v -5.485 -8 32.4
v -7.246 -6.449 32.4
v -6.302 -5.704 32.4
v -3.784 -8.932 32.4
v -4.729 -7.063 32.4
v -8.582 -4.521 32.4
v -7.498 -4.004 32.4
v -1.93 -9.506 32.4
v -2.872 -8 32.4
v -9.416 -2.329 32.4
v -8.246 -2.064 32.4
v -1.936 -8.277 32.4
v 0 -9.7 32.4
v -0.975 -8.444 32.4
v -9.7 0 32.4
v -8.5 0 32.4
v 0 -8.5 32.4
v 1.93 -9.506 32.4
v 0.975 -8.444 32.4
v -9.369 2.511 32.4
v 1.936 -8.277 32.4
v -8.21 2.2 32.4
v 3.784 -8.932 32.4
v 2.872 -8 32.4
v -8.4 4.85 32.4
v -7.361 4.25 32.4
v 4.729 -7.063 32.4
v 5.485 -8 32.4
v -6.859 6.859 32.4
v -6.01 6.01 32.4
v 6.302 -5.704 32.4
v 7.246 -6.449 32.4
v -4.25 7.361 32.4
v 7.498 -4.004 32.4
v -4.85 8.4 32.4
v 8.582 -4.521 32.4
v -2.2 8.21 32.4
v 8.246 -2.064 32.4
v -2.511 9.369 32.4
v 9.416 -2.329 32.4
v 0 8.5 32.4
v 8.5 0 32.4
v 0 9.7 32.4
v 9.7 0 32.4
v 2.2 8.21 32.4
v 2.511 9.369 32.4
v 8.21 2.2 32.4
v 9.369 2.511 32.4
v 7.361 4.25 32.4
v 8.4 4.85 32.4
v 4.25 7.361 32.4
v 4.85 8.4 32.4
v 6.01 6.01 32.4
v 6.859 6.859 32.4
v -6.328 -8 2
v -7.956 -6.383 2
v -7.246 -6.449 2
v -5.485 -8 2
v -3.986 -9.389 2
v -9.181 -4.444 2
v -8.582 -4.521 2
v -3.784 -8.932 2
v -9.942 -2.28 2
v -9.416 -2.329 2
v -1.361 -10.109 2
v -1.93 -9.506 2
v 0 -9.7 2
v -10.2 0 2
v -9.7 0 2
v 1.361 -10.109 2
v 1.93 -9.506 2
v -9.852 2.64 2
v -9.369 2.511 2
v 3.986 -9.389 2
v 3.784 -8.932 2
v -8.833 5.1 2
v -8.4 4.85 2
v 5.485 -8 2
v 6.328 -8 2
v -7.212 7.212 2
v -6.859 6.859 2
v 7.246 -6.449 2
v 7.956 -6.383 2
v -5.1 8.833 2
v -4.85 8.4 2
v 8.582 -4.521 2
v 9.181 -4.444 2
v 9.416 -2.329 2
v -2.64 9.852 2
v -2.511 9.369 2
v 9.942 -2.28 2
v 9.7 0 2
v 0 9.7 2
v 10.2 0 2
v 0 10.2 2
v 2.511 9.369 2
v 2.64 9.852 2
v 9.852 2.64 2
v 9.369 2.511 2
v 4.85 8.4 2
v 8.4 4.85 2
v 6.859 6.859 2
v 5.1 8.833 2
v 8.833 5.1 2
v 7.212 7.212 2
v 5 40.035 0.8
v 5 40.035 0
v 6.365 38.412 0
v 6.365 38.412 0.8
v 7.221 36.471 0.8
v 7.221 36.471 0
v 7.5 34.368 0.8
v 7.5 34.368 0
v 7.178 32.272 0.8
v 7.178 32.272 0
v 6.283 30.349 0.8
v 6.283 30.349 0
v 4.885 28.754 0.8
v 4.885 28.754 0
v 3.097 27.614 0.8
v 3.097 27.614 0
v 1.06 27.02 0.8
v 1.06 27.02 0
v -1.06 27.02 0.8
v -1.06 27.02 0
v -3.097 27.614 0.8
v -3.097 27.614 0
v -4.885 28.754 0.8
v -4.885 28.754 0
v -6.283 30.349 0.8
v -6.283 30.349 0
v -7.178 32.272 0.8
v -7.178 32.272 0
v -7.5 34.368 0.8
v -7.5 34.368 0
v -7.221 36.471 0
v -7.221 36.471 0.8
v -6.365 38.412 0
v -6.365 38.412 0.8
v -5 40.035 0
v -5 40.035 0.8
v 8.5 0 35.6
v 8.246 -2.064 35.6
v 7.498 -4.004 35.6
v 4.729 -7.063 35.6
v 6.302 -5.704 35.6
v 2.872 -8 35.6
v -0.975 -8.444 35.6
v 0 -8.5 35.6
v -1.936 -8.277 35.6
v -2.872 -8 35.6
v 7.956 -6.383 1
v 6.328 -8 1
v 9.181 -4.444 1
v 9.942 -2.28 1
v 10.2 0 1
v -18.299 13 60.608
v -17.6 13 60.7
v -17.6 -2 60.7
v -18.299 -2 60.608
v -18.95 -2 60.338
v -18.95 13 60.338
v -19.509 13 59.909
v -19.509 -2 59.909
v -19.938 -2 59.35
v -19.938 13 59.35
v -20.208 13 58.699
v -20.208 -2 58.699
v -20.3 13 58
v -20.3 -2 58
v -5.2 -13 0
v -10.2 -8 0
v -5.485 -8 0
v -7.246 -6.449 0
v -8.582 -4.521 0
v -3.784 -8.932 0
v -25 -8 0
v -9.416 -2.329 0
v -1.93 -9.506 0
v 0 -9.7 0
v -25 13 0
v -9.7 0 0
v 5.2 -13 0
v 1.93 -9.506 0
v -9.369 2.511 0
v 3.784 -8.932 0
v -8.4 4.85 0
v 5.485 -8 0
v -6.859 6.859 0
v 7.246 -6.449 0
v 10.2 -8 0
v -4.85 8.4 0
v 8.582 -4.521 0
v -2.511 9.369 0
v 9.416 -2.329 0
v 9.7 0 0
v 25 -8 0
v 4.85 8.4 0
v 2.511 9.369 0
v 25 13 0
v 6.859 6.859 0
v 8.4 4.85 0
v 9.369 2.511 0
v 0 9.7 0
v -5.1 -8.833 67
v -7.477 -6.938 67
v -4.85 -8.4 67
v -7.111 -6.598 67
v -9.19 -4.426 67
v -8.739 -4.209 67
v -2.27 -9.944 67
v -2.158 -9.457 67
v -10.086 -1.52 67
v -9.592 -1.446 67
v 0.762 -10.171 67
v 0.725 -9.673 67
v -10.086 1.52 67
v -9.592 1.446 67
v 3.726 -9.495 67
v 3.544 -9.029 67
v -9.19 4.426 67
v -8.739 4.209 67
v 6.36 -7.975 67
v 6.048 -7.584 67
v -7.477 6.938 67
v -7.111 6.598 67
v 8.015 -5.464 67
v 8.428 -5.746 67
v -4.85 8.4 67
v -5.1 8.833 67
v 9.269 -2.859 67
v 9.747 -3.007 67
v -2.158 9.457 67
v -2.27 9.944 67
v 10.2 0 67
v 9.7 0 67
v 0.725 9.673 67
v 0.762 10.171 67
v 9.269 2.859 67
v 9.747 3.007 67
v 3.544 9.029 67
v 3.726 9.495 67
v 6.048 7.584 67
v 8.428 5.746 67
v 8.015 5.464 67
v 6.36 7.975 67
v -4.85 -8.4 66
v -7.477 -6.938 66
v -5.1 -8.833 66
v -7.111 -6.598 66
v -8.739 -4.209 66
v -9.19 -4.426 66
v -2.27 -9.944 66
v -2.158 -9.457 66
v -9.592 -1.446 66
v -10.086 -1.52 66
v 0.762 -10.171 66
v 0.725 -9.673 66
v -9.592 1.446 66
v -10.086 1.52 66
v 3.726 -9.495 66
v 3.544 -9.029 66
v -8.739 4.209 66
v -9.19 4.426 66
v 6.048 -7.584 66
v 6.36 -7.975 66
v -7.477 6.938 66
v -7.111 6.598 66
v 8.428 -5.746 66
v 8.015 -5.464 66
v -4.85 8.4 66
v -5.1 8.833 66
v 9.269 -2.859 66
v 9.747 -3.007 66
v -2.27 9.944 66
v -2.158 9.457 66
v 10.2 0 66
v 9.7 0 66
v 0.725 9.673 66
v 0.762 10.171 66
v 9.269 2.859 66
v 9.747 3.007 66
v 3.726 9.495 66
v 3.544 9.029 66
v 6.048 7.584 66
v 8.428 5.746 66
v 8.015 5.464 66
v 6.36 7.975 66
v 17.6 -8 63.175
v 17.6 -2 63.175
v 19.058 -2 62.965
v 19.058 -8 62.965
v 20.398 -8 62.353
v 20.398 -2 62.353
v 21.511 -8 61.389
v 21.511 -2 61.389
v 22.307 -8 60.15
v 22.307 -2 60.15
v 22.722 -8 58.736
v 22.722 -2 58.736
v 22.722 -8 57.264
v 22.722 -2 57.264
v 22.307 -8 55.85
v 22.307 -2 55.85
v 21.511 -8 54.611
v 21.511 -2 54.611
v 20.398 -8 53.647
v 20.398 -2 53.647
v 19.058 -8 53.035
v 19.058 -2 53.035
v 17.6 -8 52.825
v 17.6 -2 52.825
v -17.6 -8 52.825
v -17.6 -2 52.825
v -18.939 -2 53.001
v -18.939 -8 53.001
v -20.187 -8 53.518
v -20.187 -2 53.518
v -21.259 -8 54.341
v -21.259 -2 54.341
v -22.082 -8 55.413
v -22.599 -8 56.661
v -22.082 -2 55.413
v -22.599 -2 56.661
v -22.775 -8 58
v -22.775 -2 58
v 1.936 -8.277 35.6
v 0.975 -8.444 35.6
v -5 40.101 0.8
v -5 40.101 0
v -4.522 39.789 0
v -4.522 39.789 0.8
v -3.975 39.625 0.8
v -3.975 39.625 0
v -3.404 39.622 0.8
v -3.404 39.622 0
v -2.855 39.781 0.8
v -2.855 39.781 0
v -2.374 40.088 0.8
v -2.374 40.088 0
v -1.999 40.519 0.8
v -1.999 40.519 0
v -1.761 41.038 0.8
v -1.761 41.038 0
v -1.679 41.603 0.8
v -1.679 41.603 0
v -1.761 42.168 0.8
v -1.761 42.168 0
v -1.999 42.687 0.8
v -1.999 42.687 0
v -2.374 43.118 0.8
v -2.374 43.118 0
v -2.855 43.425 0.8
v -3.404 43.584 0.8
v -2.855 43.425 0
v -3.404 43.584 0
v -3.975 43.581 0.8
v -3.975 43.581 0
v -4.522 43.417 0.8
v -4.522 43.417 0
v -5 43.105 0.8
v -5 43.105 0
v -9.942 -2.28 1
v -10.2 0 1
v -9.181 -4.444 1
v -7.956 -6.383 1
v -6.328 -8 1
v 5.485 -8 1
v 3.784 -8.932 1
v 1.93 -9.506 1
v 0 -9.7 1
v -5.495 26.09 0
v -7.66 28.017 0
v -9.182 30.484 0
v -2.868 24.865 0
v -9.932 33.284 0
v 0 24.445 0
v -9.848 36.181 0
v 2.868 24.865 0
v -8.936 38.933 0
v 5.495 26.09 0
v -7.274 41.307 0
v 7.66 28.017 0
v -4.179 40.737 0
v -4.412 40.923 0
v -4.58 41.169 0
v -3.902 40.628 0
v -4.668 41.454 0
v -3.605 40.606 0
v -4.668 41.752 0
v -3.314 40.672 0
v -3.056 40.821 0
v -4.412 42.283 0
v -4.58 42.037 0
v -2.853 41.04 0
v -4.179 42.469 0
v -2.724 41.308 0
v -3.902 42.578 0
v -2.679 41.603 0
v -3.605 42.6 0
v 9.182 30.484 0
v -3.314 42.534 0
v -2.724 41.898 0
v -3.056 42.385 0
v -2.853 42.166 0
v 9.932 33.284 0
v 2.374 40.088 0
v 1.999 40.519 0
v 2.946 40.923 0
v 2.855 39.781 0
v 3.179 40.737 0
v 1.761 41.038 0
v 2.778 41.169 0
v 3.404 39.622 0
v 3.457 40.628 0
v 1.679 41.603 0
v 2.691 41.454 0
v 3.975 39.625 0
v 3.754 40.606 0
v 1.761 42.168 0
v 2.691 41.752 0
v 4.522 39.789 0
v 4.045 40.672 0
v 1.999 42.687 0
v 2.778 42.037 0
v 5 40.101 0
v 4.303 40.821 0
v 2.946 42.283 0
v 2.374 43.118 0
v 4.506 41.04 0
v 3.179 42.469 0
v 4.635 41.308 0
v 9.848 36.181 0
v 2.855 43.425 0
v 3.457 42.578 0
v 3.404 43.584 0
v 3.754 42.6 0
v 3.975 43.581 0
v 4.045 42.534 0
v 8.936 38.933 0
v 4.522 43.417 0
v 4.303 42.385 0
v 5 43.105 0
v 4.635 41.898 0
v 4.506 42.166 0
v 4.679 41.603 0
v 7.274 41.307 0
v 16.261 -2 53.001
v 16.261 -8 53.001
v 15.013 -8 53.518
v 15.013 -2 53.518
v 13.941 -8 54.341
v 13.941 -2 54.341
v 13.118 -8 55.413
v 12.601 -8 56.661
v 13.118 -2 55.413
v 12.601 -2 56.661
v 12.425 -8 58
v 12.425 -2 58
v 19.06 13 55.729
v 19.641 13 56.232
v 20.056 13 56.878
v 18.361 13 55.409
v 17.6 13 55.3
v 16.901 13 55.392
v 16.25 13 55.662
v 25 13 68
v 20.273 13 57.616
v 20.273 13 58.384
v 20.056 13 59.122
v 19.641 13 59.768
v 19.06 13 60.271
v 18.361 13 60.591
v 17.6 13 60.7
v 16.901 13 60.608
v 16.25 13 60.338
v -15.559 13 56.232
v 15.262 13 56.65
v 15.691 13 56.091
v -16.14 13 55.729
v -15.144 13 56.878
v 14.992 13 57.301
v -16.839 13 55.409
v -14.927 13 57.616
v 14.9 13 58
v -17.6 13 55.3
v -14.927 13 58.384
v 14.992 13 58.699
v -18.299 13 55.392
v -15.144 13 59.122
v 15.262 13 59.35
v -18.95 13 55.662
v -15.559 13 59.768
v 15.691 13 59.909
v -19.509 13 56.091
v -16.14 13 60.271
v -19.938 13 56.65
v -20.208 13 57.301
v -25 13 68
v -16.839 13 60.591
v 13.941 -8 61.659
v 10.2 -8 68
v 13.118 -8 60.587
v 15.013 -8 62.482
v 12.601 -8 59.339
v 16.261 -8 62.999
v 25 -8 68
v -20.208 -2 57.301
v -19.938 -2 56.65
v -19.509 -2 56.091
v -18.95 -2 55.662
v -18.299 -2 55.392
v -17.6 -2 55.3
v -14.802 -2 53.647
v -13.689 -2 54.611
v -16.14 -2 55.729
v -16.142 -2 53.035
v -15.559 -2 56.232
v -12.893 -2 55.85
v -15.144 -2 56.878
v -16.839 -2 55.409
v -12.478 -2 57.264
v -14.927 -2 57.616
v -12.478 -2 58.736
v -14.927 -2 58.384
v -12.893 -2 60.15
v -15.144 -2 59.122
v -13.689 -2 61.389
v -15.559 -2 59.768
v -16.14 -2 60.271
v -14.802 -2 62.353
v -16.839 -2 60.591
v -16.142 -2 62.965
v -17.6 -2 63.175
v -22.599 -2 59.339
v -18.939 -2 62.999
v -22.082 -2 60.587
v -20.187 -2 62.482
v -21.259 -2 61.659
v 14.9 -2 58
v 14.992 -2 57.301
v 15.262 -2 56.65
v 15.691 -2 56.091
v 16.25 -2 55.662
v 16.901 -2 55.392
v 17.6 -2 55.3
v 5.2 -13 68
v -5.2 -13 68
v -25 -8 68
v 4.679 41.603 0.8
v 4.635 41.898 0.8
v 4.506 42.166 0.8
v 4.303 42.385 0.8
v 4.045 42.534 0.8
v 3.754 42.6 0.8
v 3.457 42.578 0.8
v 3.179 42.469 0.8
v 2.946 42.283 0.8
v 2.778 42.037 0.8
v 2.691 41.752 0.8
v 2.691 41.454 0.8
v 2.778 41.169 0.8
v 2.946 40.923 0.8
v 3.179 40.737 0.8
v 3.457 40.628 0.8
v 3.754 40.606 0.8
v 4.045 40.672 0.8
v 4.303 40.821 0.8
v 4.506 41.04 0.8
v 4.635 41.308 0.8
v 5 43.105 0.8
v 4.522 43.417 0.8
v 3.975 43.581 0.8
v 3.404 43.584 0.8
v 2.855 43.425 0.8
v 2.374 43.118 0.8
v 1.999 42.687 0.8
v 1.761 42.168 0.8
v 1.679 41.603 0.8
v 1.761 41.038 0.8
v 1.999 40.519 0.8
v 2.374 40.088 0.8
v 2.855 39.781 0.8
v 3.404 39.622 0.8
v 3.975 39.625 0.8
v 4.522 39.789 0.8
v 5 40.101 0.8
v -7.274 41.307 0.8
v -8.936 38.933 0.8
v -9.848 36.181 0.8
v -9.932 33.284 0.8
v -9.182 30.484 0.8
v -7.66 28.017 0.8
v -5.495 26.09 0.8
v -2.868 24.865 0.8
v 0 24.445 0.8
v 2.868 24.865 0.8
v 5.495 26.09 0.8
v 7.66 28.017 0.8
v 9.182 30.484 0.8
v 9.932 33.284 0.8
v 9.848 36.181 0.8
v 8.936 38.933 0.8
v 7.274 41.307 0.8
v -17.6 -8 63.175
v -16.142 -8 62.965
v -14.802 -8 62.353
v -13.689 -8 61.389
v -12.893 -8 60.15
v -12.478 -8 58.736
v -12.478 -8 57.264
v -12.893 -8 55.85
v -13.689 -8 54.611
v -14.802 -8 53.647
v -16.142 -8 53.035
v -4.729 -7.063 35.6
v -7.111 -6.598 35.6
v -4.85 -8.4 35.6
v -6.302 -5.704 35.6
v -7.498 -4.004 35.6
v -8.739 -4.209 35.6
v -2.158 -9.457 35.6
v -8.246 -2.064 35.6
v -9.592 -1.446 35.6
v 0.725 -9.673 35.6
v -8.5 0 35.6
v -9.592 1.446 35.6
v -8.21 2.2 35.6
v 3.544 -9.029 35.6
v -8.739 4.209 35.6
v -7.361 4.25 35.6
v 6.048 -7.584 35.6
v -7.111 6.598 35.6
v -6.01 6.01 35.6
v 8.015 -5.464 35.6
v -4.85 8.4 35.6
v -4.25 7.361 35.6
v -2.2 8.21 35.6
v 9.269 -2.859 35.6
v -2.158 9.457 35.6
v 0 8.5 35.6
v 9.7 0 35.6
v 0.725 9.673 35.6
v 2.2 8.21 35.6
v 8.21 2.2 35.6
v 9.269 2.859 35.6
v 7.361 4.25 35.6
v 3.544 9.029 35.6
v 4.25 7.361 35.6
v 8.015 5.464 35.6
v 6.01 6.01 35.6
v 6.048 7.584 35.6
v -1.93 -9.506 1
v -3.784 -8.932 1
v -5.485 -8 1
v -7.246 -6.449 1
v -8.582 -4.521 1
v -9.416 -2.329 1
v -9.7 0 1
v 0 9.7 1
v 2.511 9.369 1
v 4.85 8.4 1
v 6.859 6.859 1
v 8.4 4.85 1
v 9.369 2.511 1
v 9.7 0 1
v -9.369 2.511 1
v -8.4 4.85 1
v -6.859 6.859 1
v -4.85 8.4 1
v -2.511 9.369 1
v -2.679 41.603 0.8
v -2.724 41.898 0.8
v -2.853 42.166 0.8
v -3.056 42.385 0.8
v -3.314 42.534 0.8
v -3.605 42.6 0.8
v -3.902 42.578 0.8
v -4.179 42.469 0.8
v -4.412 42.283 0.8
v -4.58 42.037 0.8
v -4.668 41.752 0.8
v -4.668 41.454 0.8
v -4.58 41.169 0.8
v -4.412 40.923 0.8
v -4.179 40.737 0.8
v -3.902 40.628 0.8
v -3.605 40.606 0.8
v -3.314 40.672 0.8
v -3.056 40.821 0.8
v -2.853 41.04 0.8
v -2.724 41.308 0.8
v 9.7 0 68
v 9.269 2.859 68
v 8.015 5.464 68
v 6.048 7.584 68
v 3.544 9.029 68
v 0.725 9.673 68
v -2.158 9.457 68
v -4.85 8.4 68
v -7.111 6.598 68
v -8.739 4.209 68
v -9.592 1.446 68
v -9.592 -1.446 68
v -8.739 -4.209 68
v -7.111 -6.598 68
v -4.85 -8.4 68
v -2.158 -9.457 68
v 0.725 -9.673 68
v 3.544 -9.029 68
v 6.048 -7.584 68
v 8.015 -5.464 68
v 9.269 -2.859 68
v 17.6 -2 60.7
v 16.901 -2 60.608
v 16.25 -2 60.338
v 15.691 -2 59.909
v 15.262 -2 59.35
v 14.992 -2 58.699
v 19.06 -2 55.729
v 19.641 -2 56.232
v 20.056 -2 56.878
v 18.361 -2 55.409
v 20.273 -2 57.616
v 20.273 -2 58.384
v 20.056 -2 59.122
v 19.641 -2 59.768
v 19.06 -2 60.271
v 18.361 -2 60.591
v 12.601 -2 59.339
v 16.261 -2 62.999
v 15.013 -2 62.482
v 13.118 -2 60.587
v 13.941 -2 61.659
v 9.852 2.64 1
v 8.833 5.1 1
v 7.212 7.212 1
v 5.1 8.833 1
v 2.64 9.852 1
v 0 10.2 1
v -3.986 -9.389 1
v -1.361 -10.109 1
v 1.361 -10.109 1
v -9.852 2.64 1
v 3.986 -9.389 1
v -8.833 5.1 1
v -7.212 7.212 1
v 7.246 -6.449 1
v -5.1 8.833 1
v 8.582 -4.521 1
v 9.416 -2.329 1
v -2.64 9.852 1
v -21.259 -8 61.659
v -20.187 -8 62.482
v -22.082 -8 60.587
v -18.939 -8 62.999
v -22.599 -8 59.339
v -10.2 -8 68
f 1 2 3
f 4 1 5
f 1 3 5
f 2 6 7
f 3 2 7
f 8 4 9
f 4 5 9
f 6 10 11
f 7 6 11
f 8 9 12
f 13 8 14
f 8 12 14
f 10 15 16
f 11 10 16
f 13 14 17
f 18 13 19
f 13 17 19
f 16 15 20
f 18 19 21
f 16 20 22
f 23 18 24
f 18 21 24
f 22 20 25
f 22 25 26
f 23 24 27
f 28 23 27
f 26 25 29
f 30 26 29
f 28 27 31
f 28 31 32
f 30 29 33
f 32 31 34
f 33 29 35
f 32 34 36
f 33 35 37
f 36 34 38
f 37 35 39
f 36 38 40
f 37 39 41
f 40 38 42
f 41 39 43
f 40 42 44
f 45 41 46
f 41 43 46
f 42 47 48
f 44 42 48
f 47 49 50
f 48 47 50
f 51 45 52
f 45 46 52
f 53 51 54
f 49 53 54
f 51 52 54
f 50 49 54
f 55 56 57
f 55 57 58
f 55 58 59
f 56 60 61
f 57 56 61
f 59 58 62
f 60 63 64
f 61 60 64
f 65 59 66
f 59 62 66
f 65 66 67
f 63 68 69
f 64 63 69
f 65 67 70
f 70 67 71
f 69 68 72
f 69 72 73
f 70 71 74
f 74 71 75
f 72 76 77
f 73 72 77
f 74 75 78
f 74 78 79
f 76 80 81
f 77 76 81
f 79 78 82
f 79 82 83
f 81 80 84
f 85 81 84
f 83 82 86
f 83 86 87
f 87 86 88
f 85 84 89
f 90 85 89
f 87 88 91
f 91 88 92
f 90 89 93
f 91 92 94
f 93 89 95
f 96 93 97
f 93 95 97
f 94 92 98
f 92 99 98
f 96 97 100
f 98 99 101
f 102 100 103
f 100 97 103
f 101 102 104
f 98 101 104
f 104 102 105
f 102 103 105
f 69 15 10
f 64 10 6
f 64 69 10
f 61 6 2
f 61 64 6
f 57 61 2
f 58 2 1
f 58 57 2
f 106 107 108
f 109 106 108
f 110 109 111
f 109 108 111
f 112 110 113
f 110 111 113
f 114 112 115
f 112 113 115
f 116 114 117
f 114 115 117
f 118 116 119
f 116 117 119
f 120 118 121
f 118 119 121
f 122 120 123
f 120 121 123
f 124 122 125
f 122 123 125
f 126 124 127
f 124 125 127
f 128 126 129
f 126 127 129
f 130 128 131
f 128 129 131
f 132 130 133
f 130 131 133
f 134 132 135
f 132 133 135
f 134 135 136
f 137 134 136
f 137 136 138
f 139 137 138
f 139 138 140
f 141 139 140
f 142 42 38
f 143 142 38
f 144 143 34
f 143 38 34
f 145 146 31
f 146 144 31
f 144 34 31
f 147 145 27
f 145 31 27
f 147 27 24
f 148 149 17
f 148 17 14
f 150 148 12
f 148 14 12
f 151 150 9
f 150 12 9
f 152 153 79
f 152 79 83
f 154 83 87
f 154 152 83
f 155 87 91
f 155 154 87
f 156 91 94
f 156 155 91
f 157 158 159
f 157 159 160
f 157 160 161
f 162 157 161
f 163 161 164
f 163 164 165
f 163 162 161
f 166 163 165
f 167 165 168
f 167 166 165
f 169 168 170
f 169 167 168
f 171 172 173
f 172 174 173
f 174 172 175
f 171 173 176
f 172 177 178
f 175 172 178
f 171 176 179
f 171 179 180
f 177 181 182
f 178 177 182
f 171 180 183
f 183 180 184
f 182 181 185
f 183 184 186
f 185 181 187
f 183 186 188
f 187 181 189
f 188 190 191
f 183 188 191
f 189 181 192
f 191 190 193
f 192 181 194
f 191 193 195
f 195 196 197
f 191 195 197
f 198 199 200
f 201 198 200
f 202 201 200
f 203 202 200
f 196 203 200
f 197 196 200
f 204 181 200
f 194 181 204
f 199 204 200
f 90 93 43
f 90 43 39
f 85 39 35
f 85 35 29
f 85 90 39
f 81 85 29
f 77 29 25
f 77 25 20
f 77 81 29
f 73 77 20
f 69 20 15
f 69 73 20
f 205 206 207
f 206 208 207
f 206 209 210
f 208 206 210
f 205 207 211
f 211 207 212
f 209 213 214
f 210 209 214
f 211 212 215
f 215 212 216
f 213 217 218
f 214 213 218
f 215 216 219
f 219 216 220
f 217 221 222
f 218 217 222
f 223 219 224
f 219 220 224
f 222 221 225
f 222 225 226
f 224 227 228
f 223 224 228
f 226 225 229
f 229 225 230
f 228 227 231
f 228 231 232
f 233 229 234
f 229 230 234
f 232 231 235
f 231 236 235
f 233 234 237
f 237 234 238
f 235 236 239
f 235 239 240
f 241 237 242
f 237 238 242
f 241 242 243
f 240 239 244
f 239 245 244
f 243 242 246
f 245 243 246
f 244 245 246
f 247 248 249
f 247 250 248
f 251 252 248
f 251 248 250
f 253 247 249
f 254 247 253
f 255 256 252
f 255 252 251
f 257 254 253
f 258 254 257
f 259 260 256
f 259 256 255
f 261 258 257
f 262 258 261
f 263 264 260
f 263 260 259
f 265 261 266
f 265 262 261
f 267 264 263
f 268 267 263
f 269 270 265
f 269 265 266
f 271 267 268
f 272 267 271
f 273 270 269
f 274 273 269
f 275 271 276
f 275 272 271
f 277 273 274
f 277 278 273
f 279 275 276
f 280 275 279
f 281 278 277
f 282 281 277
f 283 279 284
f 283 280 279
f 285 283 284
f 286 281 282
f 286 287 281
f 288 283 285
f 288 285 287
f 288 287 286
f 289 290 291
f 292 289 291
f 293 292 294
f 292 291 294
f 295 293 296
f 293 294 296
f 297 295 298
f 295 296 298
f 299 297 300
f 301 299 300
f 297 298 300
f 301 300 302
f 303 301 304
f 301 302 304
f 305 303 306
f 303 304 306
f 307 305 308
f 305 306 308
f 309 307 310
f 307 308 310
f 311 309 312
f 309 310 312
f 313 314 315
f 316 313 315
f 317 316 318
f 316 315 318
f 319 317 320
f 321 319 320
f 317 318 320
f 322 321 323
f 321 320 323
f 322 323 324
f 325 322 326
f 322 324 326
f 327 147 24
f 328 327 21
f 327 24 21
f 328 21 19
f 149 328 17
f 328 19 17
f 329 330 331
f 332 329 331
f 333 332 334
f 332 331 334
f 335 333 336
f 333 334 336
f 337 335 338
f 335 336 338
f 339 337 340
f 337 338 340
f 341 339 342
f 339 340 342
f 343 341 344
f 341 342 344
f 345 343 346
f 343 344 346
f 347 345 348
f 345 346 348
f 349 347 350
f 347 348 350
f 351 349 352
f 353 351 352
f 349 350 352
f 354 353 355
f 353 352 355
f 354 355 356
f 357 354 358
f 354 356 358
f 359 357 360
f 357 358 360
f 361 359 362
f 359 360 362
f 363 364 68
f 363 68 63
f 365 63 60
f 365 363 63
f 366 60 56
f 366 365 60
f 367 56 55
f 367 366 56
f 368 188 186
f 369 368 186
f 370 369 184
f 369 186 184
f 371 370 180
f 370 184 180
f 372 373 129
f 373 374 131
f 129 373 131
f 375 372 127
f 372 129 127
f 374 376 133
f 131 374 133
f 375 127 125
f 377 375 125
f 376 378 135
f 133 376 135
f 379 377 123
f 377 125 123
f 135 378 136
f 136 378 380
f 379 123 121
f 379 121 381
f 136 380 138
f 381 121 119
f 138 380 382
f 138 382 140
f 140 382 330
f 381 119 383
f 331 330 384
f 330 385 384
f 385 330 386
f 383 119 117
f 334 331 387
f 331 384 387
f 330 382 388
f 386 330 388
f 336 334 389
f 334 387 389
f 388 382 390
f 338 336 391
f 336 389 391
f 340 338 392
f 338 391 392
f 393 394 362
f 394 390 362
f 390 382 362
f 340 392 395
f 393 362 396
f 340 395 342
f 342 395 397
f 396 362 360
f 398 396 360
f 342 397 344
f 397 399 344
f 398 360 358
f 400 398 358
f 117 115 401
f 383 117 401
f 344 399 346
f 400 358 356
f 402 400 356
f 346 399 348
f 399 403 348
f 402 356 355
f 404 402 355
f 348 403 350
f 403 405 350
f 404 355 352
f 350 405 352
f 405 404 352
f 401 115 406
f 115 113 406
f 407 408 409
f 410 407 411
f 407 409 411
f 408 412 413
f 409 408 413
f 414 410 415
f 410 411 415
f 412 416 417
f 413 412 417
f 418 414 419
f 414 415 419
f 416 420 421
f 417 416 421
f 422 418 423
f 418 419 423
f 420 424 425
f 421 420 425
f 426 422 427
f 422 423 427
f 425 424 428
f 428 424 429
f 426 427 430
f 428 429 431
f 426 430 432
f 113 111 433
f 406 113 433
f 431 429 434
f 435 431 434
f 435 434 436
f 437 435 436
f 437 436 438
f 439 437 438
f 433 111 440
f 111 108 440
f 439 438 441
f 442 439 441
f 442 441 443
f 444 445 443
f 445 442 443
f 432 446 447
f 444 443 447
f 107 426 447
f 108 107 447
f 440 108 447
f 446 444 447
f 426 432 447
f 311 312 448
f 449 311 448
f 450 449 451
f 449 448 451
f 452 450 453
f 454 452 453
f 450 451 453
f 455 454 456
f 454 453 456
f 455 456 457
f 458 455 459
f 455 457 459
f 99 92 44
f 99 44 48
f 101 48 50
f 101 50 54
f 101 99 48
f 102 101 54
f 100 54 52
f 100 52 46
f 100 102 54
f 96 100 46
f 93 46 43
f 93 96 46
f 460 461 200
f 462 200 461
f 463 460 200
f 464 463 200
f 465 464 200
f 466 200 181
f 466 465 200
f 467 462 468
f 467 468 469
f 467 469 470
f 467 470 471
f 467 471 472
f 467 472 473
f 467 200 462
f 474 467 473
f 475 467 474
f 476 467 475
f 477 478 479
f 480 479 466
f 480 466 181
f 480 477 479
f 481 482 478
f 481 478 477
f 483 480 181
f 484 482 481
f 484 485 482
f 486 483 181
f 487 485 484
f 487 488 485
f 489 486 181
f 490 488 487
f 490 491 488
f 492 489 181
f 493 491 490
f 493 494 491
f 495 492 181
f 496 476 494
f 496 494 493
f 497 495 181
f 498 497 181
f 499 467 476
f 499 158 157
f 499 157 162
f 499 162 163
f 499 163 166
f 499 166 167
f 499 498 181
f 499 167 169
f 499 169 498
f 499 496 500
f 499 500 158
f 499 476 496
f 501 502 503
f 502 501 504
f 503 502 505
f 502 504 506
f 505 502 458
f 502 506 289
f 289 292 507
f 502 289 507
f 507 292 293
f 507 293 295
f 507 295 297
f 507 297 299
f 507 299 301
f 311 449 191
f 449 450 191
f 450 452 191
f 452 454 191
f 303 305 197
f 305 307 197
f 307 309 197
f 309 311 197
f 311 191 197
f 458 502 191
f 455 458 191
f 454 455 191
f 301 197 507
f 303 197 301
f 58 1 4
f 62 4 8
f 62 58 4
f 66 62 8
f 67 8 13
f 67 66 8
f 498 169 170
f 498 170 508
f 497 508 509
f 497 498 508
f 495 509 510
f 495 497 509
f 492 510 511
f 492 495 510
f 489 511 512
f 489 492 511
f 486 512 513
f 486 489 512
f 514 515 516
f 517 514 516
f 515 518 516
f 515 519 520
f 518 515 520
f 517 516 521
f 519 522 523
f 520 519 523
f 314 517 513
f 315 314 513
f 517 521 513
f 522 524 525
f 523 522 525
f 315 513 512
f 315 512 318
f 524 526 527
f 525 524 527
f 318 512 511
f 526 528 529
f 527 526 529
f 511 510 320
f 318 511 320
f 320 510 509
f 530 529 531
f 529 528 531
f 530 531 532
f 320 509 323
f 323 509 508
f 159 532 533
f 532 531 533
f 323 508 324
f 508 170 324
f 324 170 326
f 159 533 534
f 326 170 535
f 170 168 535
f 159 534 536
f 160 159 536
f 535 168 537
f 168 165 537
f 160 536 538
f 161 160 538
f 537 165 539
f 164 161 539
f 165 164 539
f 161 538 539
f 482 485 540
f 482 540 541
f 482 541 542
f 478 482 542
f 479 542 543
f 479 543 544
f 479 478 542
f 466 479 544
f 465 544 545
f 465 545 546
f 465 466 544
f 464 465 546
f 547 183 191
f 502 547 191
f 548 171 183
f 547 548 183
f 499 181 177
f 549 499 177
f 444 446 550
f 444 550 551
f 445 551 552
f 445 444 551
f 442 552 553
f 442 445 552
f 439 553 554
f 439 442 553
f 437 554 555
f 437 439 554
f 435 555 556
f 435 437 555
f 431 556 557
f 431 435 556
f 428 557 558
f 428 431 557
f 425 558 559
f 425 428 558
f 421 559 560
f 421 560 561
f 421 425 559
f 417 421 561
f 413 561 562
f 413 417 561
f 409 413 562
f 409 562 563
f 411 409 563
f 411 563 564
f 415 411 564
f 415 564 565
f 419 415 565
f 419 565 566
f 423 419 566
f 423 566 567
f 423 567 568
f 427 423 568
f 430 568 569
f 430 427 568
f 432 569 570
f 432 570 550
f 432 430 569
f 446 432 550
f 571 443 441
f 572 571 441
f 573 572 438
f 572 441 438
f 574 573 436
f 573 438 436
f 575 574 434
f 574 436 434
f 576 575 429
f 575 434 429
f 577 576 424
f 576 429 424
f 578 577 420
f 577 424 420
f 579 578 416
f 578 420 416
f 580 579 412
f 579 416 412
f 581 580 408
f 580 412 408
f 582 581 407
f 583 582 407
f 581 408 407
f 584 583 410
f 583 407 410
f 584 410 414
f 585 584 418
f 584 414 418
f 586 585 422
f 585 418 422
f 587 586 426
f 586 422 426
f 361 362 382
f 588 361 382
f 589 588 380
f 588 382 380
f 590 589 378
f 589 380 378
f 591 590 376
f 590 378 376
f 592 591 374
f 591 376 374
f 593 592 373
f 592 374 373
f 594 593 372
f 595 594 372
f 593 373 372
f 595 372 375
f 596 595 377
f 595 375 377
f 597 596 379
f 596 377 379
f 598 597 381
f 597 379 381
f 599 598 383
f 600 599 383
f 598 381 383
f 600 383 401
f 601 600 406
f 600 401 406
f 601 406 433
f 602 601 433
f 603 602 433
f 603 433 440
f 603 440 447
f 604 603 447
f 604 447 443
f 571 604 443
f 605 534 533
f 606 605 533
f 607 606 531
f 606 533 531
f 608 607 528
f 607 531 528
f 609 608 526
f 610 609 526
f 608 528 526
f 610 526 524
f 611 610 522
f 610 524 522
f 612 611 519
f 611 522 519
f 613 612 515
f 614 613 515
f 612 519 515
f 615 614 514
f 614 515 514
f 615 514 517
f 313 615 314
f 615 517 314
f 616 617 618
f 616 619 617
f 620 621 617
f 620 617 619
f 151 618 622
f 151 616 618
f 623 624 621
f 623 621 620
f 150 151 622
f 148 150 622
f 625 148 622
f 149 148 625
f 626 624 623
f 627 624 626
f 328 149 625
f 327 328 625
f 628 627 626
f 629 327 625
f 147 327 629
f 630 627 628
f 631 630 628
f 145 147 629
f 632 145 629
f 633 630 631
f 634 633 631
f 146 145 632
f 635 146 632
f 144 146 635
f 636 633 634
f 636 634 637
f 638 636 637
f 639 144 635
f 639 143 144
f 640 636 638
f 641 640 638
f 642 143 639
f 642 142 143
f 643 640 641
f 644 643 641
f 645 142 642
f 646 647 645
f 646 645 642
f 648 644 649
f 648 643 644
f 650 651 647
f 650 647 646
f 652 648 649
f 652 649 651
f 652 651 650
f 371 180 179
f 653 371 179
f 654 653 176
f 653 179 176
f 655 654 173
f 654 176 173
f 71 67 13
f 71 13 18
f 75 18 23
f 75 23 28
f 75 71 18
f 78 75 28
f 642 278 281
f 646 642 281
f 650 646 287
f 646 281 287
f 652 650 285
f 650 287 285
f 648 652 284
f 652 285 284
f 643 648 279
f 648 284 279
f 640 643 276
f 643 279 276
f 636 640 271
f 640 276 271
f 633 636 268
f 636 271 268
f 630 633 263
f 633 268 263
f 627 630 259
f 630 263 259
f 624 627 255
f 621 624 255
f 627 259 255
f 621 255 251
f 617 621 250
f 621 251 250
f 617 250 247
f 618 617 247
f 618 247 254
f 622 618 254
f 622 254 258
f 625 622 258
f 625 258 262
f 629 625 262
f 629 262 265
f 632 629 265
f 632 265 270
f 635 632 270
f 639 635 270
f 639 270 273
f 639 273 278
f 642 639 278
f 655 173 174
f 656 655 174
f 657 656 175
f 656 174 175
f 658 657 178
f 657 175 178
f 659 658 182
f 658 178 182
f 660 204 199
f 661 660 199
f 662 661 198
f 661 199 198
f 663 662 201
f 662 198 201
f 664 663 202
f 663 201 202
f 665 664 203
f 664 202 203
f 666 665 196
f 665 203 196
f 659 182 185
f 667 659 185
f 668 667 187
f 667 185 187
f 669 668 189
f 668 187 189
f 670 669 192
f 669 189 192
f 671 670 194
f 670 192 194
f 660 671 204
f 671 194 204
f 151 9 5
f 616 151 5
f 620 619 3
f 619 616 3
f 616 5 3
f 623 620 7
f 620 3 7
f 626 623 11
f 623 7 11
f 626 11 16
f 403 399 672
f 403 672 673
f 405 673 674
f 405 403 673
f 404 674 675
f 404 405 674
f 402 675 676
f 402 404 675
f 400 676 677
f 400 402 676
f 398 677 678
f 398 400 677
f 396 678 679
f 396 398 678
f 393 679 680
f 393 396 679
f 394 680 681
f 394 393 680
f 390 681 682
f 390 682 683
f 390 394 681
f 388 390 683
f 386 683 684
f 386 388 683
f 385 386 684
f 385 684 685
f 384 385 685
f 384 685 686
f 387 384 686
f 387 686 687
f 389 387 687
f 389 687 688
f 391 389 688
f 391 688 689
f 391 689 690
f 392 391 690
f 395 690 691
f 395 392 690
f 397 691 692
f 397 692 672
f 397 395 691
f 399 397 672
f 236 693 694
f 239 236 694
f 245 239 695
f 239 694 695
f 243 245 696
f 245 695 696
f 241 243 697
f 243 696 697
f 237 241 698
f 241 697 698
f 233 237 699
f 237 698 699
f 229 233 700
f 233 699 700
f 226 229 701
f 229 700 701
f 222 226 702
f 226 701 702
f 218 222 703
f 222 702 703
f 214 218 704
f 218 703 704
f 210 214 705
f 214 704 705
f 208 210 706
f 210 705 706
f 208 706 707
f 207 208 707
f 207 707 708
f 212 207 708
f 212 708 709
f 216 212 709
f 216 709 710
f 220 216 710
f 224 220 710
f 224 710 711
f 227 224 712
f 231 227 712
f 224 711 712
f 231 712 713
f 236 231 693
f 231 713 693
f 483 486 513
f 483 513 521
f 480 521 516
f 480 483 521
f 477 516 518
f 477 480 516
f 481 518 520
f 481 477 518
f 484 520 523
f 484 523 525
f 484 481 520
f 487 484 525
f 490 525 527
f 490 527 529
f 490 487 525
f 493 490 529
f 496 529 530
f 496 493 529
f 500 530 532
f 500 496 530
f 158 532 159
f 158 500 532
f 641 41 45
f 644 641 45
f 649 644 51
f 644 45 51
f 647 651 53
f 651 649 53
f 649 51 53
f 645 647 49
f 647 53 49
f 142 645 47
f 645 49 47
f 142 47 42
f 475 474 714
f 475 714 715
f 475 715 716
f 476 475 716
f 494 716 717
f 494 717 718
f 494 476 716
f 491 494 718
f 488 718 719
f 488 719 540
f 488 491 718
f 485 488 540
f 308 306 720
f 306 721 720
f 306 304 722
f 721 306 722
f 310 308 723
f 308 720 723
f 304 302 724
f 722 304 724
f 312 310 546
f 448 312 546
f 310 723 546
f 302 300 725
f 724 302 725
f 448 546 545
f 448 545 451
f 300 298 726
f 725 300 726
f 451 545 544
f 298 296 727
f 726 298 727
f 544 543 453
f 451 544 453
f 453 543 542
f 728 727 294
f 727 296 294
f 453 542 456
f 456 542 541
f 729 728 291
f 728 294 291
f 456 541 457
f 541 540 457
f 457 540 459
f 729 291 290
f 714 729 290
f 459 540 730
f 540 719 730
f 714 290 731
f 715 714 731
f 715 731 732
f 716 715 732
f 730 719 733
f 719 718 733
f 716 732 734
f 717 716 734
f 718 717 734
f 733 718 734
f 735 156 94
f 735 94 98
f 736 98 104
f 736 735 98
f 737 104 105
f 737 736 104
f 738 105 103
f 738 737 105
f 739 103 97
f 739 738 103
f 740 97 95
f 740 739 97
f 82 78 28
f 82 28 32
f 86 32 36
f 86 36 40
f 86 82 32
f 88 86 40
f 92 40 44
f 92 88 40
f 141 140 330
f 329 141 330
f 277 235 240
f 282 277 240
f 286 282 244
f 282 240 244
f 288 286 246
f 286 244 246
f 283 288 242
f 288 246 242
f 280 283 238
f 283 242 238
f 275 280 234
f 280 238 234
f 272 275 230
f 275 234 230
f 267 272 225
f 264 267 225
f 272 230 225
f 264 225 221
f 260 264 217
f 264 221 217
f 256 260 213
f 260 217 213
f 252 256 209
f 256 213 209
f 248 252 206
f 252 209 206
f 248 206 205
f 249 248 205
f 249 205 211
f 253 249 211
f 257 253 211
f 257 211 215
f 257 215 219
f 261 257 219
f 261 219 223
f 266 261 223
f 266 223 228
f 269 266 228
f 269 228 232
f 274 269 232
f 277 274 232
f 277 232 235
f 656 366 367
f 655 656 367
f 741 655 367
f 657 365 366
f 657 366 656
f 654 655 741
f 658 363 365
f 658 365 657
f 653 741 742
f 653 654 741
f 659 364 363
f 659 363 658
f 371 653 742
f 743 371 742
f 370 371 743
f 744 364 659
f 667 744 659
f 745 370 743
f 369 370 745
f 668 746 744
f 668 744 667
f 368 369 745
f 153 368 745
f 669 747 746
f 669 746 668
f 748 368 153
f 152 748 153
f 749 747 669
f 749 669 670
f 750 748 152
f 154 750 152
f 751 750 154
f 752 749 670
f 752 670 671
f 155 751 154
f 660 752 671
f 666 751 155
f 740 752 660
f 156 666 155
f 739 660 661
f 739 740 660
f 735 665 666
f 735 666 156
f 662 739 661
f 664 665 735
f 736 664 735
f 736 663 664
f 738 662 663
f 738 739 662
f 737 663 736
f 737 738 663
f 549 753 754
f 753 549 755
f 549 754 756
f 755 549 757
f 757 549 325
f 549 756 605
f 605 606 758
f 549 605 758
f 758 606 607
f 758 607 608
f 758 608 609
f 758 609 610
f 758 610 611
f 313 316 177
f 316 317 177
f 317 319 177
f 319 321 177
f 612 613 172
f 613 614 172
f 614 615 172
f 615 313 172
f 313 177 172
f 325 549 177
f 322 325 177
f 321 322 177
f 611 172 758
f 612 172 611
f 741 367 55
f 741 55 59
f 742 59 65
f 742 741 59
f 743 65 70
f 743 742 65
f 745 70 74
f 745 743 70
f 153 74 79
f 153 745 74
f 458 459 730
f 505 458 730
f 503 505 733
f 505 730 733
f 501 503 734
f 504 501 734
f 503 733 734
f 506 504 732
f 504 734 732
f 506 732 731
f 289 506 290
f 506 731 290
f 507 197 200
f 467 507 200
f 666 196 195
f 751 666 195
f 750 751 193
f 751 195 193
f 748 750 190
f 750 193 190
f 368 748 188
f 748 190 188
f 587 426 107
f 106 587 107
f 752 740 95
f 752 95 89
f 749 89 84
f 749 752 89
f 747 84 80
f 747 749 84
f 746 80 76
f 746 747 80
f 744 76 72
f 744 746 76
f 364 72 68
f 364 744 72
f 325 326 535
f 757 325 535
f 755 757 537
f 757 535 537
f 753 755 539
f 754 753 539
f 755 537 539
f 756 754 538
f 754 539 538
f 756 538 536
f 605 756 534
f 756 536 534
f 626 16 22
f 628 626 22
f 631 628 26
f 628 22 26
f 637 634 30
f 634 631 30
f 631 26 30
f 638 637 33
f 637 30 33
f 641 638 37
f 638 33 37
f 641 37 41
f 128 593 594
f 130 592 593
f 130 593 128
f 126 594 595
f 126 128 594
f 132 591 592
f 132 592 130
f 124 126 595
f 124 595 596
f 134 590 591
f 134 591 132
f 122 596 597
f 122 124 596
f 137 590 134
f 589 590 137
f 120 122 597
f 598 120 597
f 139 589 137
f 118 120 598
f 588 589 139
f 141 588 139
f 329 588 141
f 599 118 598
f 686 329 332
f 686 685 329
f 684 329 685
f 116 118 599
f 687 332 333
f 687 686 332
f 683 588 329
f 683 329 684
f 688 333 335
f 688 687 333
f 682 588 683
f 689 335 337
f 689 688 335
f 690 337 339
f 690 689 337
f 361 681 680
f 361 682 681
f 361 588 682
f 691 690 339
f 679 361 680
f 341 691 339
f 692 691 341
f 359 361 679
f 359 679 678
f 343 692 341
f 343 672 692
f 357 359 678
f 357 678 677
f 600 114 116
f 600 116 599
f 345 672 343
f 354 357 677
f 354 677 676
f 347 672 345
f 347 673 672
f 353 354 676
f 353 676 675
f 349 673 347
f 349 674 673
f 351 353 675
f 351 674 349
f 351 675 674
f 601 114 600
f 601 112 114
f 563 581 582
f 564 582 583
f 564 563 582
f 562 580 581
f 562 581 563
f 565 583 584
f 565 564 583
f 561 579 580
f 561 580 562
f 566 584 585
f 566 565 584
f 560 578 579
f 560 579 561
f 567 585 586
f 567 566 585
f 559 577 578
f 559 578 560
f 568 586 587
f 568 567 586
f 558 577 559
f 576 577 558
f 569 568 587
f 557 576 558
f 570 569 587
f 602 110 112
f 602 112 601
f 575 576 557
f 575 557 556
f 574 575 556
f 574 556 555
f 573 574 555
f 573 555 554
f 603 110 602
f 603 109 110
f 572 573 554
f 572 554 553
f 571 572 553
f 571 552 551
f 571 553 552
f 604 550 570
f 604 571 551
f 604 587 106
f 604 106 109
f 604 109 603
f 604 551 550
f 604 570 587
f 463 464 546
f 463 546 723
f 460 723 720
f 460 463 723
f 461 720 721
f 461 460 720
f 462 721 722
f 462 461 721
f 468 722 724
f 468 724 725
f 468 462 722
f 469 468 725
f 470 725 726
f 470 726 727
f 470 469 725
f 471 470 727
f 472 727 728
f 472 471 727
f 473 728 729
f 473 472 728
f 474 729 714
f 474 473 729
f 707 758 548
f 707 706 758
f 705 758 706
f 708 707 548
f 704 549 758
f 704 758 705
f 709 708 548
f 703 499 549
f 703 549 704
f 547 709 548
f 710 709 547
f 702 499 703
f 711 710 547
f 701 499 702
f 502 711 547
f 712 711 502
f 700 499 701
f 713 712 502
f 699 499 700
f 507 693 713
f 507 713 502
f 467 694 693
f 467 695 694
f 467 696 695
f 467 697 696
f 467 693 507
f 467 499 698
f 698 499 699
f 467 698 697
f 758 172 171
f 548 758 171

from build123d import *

# Parameters (mm, degrees)
F0_W      = 12.8
F0_H      = 8
F0_W_2    = 2
F1_DEPTH  = 68
F2_DEPTH  = 32.4
F3_DEPTH  = 2
F4_DEPTH  = 1
F5_R      = 9.7
F5_R_2    = 8.5
F6_DEPTH  = 32.4
F5_R_3    = 10.2
F7_DEPTH  = 2
F8_DEPTH  = 1
F10_DEPTH = 21
F11_DEPTH = 15
F12_R     = 1
F13_DEPTH = 0.8


with BuildPart() as f1:
    # F0 (on Top) → F1 (new body)
    with BuildSketch(Plane.XY):
        Polygon((-10.2, 13), (-25, 13), (-25, 5), (-23, 3), (-23, 0), (-10.2, 0), align=None)
        with BuildLine():
            Line((0, 13), (-10.2, 13))
            Line((-10.2, 13), (-10.2, 0))
            ThreePointArc((-10.2, 0), (-7.2124891681, 7.2124891681), (0, 10.2))
            Line((0, 10.2), (0, 13))
        make_face()
        with BuildLine():
            Line((10.2, 13), (0, 13))
            Line((0, 13), (0, 10.2))
            ThreePointArc((0, 10.2), (7.2124891681, 7.2124891681), (10.2, 0))
            Line((10.2, 0), (10.2, 13))
        make_face()
        Polygon((25, 13), (10.2, 13), (10.2, 0), (23, 0), (23, 3), (25, 5), align=None)
        with BuildLine():
            ThreePointArc((0, -10.2), (-3.3496268449, -9.6343136756), (-6.3277168078, -8))
            Line((-6.3277168078, -8), (-10.2, -8))
            Line((-10.2, -8), (-5.2, -13))
            Line((-5.2, -13), (0, -13))
            Line((0, -13), (0, -10.2))
        make_face()
        with Locations((-16.6, -4)):
            Rectangle(F0_W, F0_H)
        with BuildLine():
            ThreePointArc((-6.3277168078, -8), (-9.1810323886, -4.4439446756), (-10.2, 0))
            Line((-10.2, 0), (-10.2, -8))
            Line((-10.2, -8), (-6.3277168078, -8))
        make_face()
        with Locations((16.6, -4)):
            Rectangle(F0_W, F0_H)
        with BuildLine():
            Line((10.2, -8), (10.2, 0))
            ThreePointArc((10.2, 0), (9.1810323886, -4.4439446756), (6.3277168078, -8))
            Line((6.3277168078, -8), (10.2, -8))
        make_face()
        with BuildLine():
            ThreePointArc((6.3277168078, -8), (3.3496268449, -9.6343136756), (0, -10.2))
            Line((0, -10.2), (0, -13))
            Line((0, -13), (5.2, -13))
            Line((5.2, -13), (10.2, -8))
            Line((10.2, -8), (6.3277168078, -8))
        make_face()
        with BuildLine():
            Line((-9.7, 0), (-10.2, 0))
            ThreePointArc((-10.2, 0), (-9.1810323886, -4.4439446756), (-6.3277168078, -8))
            Line((-6.3277168078, -8), (-5.4854352608, -8))
            ThreePointArc((-5.4854352608, -8), (-8.5819205901, -4.5211324892), (-9.7, 0))
        make_face()
        with BuildLine():
            Line((-5.4854352608, -8), (-6.3277168078, -8))
            ThreePointArc((-6.3277168078, -8), (-3.3496268449, -9.6343136756), (0, -10.2))
            Line((0, -10.2), (0, -9.7))
            ThreePointArc((0, -9.7), (-2.8714108031, -9.2652576866), (-5.4854352608, -8))
        make_face()
        with BuildLine():
            Line((0, -9.7), (0, -10.2))
            ThreePointArc((0, -10.2), (3.3496268449, -9.6343136756), (6.3277168078, -8))
            Line((6.3277168078, -8), (5.4854352608, -8))
            ThreePointArc((5.4854352608, -8), (2.8714108031, -9.2652576866), (0, -9.7))
        make_face()
        with BuildLine():
            ThreePointArc((6.3277168078, -8), (9.1810323886, -4.4439446756), (10.2, 0))
            Line((10.2, 0), (9.7, 0))
            ThreePointArc((9.7, 0), (8.5819205901, -4.5211324892), (5.4854352608, -8))
            Line((5.4854352608, -8), (6.3277168078, -8))
        make_face()
        with BuildLine():
            ThreePointArc((10.2, 0), (7.2124891681, 7.2124891681), (0, 10.2))
            Line((0, 10.2), (0, 9.7))
            ThreePointArc((0, 9.7), (6.8589357775, 6.8589357775), (9.7, 0))
            Line((9.7, 0), (10.2, 0))
        make_face()
        with BuildLine():
            ThreePointArc((0, 10.2), (-7.2124891681, 7.2124891681), (-10.2, 0))
            Line((-10.2, 0), (-9.7, 0))
            ThreePointArc((-9.7, 0), (-6.8589357775, 6.8589357775), (0, 9.7))
            Line((0, 9.7), (0, 10.2))
        make_face()
        with BuildLine():
            ThreePointArc((0, 9.7), (-6.8589357775, 6.8589357775), (-9.7, 0))
            Line((-9.7, 0), (-8.5, 0))
            ThreePointArc((-8.5, 0), (-6.0104076401, 6.0104076401), (0, 8.5))
            Line((0, 8.5), (0, 9.7))
        make_face()
        with BuildLine():
            Line((-8.5, 0), (-9.7, 0))
            ThreePointArc((-9.7, 0), (-8.5819205901, -4.5211324892), (-5.4854352608, -8))
            Line((-5.4854352608, -8), (-2.8722813233, -8))
            ThreePointArc((-2.8722813233, -8), (-6.9521360476, -4.8905832348), (-8.5, 0))
        make_face()
        with BuildLine():
            Line((-2.8722813233, -8), (-5.4854352608, -8))
            ThreePointArc((-5.4854352608, -8), (-2.8714108031, -9.2652576866), (0, -9.7))
            Line((0, -9.7), (0, -8.5))
            ThreePointArc((0, -8.5), (-1.4577379737, -8.3740671122), (-2.8722813233, -8))
        make_face()
        with BuildLine():
            Line((0, -8.5), (0, -9.7))
            ThreePointArc((0, -9.7), (2.8714108031, -9.2652576866), (5.4854352608, -8))
            Line((5.4854352608, -8), (2.8722813233, -8))
            ThreePointArc((2.8722813233, -8), (1.4577379737, -8.3740671122), (0, -8.5))
        make_face()
        with BuildLine():
            ThreePointArc((5.4854352608, -8), (8.5819205901, -4.5211324892), (9.7, 0))
            Line((9.7, 0), (8.5, 0))
            ThreePointArc((8.5, 0), (6.9521360476, -4.8905832348), (2.8722813233, -8))
            Line((2.8722813233, -8), (5.4854352608, -8))
        make_face()
        with BuildLine():
            ThreePointArc((9.7, 0), (6.8589357775, 6.8589357775), (0, 9.7))
            Line((0, 9.7), (0, 8.5))
            ThreePointArc((0, 8.5), (6.0104076401, 6.0104076401), (8.5, 0))
            Line((8.5, 0), (9.7, 0))
        make_face()
        with Locations((24, -4)):
            Rectangle(F0_W_2, F0_H)
        Polygon((25, 3), (25, 5), (23, 3), (23, 0), (25, 0), align=None)
        with Locations((-24, -4)):
            Rectangle(F0_W_2, F0_H)
        Polygon((-23, 3), (-25, 5), (-25, 3), (-25, 0), (-23, 0), align=None)
    extrude(amount=F1_DEPTH)

    # F0 (on Top) → F2 (cut)
    with BuildSketch(Plane.XY):
        with BuildLine():
            Line((-8.5, 0), (-9.7, 0))
            ThreePointArc((-9.7, 0), (-8.5819205901, -4.5211324892), (-5.4854352608, -8))
            Line((-5.4854352608, -8), (-2.8722813233, -8))
            ThreePointArc((-2.8722813233, -8), (-6.9521360476, -4.8905832348), (-8.5, 0))
        make_face()
        with BuildLine():
            Line((-2.8722813233, -8), (-5.4854352608, -8))
            ThreePointArc((-5.4854352608, -8), (-2.8714108031, -9.2652576866), (0, -9.7))
            Line((0, -9.7), (0, -8.5))
            ThreePointArc((0, -8.5), (-1.4577379737, -8.3740671122), (-2.8722813233, -8))
        make_face()
        with BuildLine():
            Line((0, -8.5), (0, -9.7))
            ThreePointArc((0, -9.7), (2.8714108031, -9.2652576866), (5.4854352608, -8))
            Line((5.4854352608, -8), (2.8722813233, -8))
            ThreePointArc((2.8722813233, -8), (1.4577379737, -8.3740671122), (0, -8.5))
        make_face()
        with BuildLine():
            ThreePointArc((5.4854352608, -8), (8.5819205901, -4.5211324892), (9.7, 0))
            Line((9.7, 0), (8.5, 0))
            ThreePointArc((8.5, 0), (6.9521360476, -4.8905832348), (2.8722813233, -8))
            Line((2.8722813233, -8), (5.4854352608, -8))
        make_face()
        with BuildLine():
            ThreePointArc((9.7, 0), (6.8589357775, 6.8589357775), (0, 9.7))
            Line((0, 9.7), (0, 8.5))
            ThreePointArc((0, 8.5), (6.0104076401, 6.0104076401), (8.5, 0))
            Line((8.5, 0), (9.7, 0))
        make_face()
        with BuildLine():
            ThreePointArc((0, 9.7), (-6.8589357775, 6.8589357775), (-9.7, 0))
            Line((-9.7, 0), (-8.5, 0))
            ThreePointArc((-8.5, 0), (-6.0104076401, 6.0104076401), (0, 8.5))
            Line((0, 8.5), (0, 9.7))
        make_face()
    extrude(amount=F2_DEPTH, mode=Mode.SUBTRACT)

    # F0 (on Top) → F3 (cut)
    with BuildSketch(Plane.XY):
        with BuildLine():
            Line((0, -9.7), (0, -10.2))
            ThreePointArc((0, -10.2), (3.3496268449, -9.6343136756), (6.3277168078, -8))
            Line((6.3277168078, -8), (5.4854352608, -8))
            ThreePointArc((5.4854352608, -8), (2.8714108031, -9.2652576866), (0, -9.7))
        make_face()
        with BuildLine():
            ThreePointArc((6.3277168078, -8), (9.1810323886, -4.4439446756), (10.2, 0))
            Line((10.2, 0), (9.7, 0))
            ThreePointArc((9.7, 0), (8.5819205901, -4.5211324892), (5.4854352608, -8))
            Line((5.4854352608, -8), (6.3277168078, -8))
        make_face()
        with BuildLine():
            ThreePointArc((10.2, 0), (7.2124891681, 7.2124891681), (0, 10.2))
            Line((0, 10.2), (0, 9.7))
            ThreePointArc((0, 9.7), (6.8589357775, 6.8589357775), (9.7, 0))
            Line((9.7, 0), (10.2, 0))
        make_face()
        with BuildLine():
            ThreePointArc((0, 10.2), (-7.2124891681, 7.2124891681), (-10.2, 0))
            Line((-10.2, 0), (-9.7, 0))
            ThreePointArc((-9.7, 0), (-6.8589357775, 6.8589357775), (0, 9.7))
            Line((0, 9.7), (0, 10.2))
        make_face()
        with BuildLine():
            Line((-9.7, 0), (-10.2, 0))
            ThreePointArc((-10.2, 0), (-9.1810323886, -4.4439446756), (-6.3277168078, -8))
            Line((-6.3277168078, -8), (-5.4854352608, -8))
            ThreePointArc((-5.4854352608, -8), (-8.5819205901, -4.5211324892), (-9.7, 0))
        make_face()
        with BuildLine():
            Line((-5.4854352608, -8), (-6.3277168078, -8))
            ThreePointArc((-6.3277168078, -8), (-3.3496268449, -9.6343136756), (0, -10.2))
            Line((0, -10.2), (0, -9.7))
            ThreePointArc((0, -9.7), (-2.8714108031, -9.2652576866), (-5.4854352608, -8))
        make_face()
    extrude(amount=F3_DEPTH, mode=Mode.SUBTRACT)

    # F0 (on Top) → F4 (join)
    with BuildSketch(Plane.XY):
        with BuildLine():
            Line((-9.7, 0), (-10.2, 0))
            ThreePointArc((-10.2, 0), (-9.1810323886, -4.4439446756), (-6.3277168078, -8))
            Line((-6.3277168078, -8), (-5.4854352608, -8))
            ThreePointArc((-5.4854352608, -8), (-8.5819205901, -4.5211324892), (-9.7, 0))
        make_face()
        with BuildLine():
            Line((-5.4854352608, -8), (-6.3277168078, -8))
            ThreePointArc((-6.3277168078, -8), (-3.3496268449, -9.6343136756), (0, -10.2))
            Line((0, -10.2), (0, -9.7))
            ThreePointArc((0, -9.7), (-2.8714108031, -9.2652576866), (-5.4854352608, -8))
        make_face()
        with BuildLine():
            Line((0, -9.7), (0, -10.2))
            ThreePointArc((0, -10.2), (3.3496268449, -9.6343136756), (6.3277168078, -8))
            Line((6.3277168078, -8), (5.4854352608, -8))
            ThreePointArc((5.4854352608, -8), (2.8714108031, -9.2652576866), (0, -9.7))
        make_face()
        with BuildLine():
            ThreePointArc((6.3277168078, -8), (9.1810323886, -4.4439446756), (10.2, 0))
            Line((10.2, 0), (9.7, 0))
            ThreePointArc((9.7, 0), (8.5819205901, -4.5211324892), (5.4854352608, -8))
            Line((5.4854352608, -8), (6.3277168078, -8))
        make_face()
        with BuildLine():
            ThreePointArc((10.2, 0), (7.2124891681, 7.2124891681), (0, 10.2))
            Line((0, 10.2), (0, 9.7))
            ThreePointArc((0, 9.7), (6.8589357775, 6.8589357775), (9.7, 0))
            Line((9.7, 0), (10.2, 0))
        make_face()
        with BuildLine():
            ThreePointArc((0, 10.2), (-7.2124891681, 7.2124891681), (-10.2, 0))
            Line((-10.2, 0), (-9.7, 0))
            ThreePointArc((-9.7, 0), (-6.8589357775, 6.8589357775), (0, 9.7))
            Line((0, 9.7), (0, 10.2))
        make_face()
    extrude(amount=F4_DEPTH)

    # F5 (on face) → F6 (cut)
    with BuildSketch(Plane.XY.offset(68)):
        Circle(F5_R)
        Circle(F5_R_2, mode=Mode.SUBTRACT)
    extrude(amount=-F6_DEPTH, mode=Mode.SUBTRACT)

    # F5 (on face) → F7 (cut)
    with BuildSketch(Plane.XY.offset(68)):
        Circle(F5_R_3)
        Circle(F5_R, mode=Mode.SUBTRACT)
    extrude(amount=-F7_DEPTH, mode=Mode.SUBTRACT)

    # F5 (on face) → F8 (join)
    with BuildSketch(Plane.XY.offset(68)):
        Circle(F5_R_3)
        Circle(F5_R, mode=Mode.SUBTRACT)
    extrude(amount=-F8_DEPTH)

    # F9 (on face) → F10 (cut)
    with BuildSketch(Plane(origin=(0, 13, 0), x_dir=(-1, 0, 0), z_dir=(0, 1, 0))):
        with BuildLine():
            ThreePointArc((-12.425, 58), (-13.9407224074, 61.6592775926), (-17.6, 63.175))
            Line((-17.6, 63.175), (-17.6, 60.7))
            ThreePointArc((-17.6, 60.7), (-15.6908116908, 59.9091883092), (-14.9, 58))
            ThreePointArc((-14.9, 58), (-15.6908116908, 56.0908116908), (-17.6, 55.3))
            Line((-17.6, 55.3), (-17.6, 52.825))
            ThreePointArc((-17.6, 52.825), (-13.9407224074, 54.3407224074), (-12.425, 58))
        make_face()
        with BuildLine():
            Line((-17.6, 60.7), (-17.6, 63.175))
            ThreePointArc((-17.6, 63.175), (-22.775, 58), (-17.6, 52.825))
            Line((-17.6, 52.825), (-17.6, 55.3))
            ThreePointArc((-17.6, 55.3), (-20.3, 58), (-17.6, 60.7))
        make_face()
        with BuildLine():
            Line((17.6, 60.7), (17.6, 63.175))
            ThreePointArc((17.6, 63.175), (12.425, 58), (17.6, 52.825))
            Line((17.6, 52.825), (17.6, 55.3))
            ThreePointArc((17.6, 55.3), (14.9, 58), (17.6, 60.7))
        make_face()
        with BuildLine():
            ThreePointArc((22.775, 58), (21.2592775926, 61.6592775926), (17.6, 63.175))
            Line((17.6, 63.175), (17.6, 60.7))
            ThreePointArc((17.6, 60.7), (19.5091883092, 59.9091883092), (20.3, 58))
            ThreePointArc((20.3, 58), (19.5091883092, 56.0908116908), (17.6, 55.3))
            Line((17.6, 55.3), (17.6, 52.825))
            ThreePointArc((17.6, 52.825), (21.2592775926, 54.3407224074), (22.775, 58))
        make_face()
        with BuildLine():
            Line((17.6, 55.3), (17.6, 60.7))
            ThreePointArc((17.6, 60.7), (14.9, 58), (17.6, 55.3))
        make_face()
        with BuildLine():
            ThreePointArc((20.3, 58), (19.5091883092, 59.9091883092), (17.6, 60.7))
            Line((17.6, 60.7), (17.6, 55.3))
            ThreePointArc((17.6, 55.3), (19.5091883092, 56.0908116908), (20.3, 58))
        make_face()
        with BuildLine():
            ThreePointArc((-14.9, 58), (-15.6908116908, 59.9091883092), (-17.6, 60.7))
            Line((-17.6, 60.7), (-17.6, 55.3))
            ThreePointArc((-17.6, 55.3), (-15.6908116908, 56.0908116908), (-14.9, 58))
        make_face()
        with BuildLine():
            Line((-17.6, 55.3), (-17.6, 60.7))
            ThreePointArc((-17.6, 60.7), (-20.3, 58), (-17.6, 55.3))
        make_face()
    extrude(amount=-F10_DEPTH, mode=Mode.SUBTRACT)

    # F9 (on face) → F11 (join)
    with BuildSketch(Plane(origin=(0, 13, 0), x_dir=(-1, 0, 0), z_dir=(0, 1, 0))):
        with BuildLine():
            Line((-17.6, 60.7), (-17.6, 63.175))
            ThreePointArc((-17.6, 63.175), (-22.775, 58), (-17.6, 52.825))
            Line((-17.6, 52.825), (-17.6, 55.3))
            ThreePointArc((-17.6, 55.3), (-20.3, 58), (-17.6, 60.7))
        make_face()
        with BuildLine():
            ThreePointArc((-12.425, 58), (-13.9407224074, 61.6592775926), (-17.6, 63.175))
            Line((-17.6, 63.175), (-17.6, 60.7))
            ThreePointArc((-17.6, 60.7), (-15.6908116908, 59.9091883092), (-14.9, 58))
            ThreePointArc((-14.9, 58), (-15.6908116908, 56.0908116908), (-17.6, 55.3))
            Line((-17.6, 55.3), (-17.6, 52.825))
            ThreePointArc((-17.6, 52.825), (-13.9407224074, 54.3407224074), (-12.425, 58))
        make_face()
        with BuildLine():
            Line((17.6, 60.7), (17.6, 63.175))
            ThreePointArc((17.6, 63.175), (12.425, 58), (17.6, 52.825))
            Line((17.6, 52.825), (17.6, 55.3))
            ThreePointArc((17.6, 55.3), (14.9, 58), (17.6, 60.7))
        make_face()
        with BuildLine():
            ThreePointArc((22.775, 58), (21.2592775926, 61.6592775926), (17.6, 63.175))
            Line((17.6, 63.175), (17.6, 60.7))
            ThreePointArc((17.6, 60.7), (19.5091883092, 59.9091883092), (20.3, 58))
            ThreePointArc((20.3, 58), (19.5091883092, 56.0908116908), (17.6, 55.3))
            Line((17.6, 55.3), (17.6, 52.825))
            ThreePointArc((17.6, 52.825), (21.2592775926, 54.3407224074), (22.775, 58))
        make_face()
    extrude(amount=-F11_DEPTH)


with BuildPart() as f13:
    # F12 (on Top) → F13 (new body)
    with BuildSketch(Plane.XY):
        with BuildLine():
            ThreePointArc((-5, 40.1008925547), (-1.6794122544, 41.6029072038), (-5, 43.1049218529))
            ThreePointArc((-5, 43.1049218529), (0, 24.4446678151), (5, 43.1049218529))
            ThreePointArc((5, 43.1049218529), (1.6794122544, 41.6029072038), (5, 40.1008925547))
            Line((5, 40.1008925547), (5, 40.0348377588))
            ThreePointArc((5, 40.0348377588), (0, 26.9446678151), (-5, 40.0348377588))
            Line((-5, 40.0348377588), (-5, 40.1008925547))
        make_face()
        with Locations((-3.6794122544, 41.6029072038)):
            Circle(F12_R, mode=Mode.SUBTRACT)
        with Locations((3.6794122544, 41.6029072038)):
            Circle(F12_R, mode=Mode.SUBTRACT)
    extrude(amount=F13_DEPTH)


solid = Compound([f1.part, f13.part])
